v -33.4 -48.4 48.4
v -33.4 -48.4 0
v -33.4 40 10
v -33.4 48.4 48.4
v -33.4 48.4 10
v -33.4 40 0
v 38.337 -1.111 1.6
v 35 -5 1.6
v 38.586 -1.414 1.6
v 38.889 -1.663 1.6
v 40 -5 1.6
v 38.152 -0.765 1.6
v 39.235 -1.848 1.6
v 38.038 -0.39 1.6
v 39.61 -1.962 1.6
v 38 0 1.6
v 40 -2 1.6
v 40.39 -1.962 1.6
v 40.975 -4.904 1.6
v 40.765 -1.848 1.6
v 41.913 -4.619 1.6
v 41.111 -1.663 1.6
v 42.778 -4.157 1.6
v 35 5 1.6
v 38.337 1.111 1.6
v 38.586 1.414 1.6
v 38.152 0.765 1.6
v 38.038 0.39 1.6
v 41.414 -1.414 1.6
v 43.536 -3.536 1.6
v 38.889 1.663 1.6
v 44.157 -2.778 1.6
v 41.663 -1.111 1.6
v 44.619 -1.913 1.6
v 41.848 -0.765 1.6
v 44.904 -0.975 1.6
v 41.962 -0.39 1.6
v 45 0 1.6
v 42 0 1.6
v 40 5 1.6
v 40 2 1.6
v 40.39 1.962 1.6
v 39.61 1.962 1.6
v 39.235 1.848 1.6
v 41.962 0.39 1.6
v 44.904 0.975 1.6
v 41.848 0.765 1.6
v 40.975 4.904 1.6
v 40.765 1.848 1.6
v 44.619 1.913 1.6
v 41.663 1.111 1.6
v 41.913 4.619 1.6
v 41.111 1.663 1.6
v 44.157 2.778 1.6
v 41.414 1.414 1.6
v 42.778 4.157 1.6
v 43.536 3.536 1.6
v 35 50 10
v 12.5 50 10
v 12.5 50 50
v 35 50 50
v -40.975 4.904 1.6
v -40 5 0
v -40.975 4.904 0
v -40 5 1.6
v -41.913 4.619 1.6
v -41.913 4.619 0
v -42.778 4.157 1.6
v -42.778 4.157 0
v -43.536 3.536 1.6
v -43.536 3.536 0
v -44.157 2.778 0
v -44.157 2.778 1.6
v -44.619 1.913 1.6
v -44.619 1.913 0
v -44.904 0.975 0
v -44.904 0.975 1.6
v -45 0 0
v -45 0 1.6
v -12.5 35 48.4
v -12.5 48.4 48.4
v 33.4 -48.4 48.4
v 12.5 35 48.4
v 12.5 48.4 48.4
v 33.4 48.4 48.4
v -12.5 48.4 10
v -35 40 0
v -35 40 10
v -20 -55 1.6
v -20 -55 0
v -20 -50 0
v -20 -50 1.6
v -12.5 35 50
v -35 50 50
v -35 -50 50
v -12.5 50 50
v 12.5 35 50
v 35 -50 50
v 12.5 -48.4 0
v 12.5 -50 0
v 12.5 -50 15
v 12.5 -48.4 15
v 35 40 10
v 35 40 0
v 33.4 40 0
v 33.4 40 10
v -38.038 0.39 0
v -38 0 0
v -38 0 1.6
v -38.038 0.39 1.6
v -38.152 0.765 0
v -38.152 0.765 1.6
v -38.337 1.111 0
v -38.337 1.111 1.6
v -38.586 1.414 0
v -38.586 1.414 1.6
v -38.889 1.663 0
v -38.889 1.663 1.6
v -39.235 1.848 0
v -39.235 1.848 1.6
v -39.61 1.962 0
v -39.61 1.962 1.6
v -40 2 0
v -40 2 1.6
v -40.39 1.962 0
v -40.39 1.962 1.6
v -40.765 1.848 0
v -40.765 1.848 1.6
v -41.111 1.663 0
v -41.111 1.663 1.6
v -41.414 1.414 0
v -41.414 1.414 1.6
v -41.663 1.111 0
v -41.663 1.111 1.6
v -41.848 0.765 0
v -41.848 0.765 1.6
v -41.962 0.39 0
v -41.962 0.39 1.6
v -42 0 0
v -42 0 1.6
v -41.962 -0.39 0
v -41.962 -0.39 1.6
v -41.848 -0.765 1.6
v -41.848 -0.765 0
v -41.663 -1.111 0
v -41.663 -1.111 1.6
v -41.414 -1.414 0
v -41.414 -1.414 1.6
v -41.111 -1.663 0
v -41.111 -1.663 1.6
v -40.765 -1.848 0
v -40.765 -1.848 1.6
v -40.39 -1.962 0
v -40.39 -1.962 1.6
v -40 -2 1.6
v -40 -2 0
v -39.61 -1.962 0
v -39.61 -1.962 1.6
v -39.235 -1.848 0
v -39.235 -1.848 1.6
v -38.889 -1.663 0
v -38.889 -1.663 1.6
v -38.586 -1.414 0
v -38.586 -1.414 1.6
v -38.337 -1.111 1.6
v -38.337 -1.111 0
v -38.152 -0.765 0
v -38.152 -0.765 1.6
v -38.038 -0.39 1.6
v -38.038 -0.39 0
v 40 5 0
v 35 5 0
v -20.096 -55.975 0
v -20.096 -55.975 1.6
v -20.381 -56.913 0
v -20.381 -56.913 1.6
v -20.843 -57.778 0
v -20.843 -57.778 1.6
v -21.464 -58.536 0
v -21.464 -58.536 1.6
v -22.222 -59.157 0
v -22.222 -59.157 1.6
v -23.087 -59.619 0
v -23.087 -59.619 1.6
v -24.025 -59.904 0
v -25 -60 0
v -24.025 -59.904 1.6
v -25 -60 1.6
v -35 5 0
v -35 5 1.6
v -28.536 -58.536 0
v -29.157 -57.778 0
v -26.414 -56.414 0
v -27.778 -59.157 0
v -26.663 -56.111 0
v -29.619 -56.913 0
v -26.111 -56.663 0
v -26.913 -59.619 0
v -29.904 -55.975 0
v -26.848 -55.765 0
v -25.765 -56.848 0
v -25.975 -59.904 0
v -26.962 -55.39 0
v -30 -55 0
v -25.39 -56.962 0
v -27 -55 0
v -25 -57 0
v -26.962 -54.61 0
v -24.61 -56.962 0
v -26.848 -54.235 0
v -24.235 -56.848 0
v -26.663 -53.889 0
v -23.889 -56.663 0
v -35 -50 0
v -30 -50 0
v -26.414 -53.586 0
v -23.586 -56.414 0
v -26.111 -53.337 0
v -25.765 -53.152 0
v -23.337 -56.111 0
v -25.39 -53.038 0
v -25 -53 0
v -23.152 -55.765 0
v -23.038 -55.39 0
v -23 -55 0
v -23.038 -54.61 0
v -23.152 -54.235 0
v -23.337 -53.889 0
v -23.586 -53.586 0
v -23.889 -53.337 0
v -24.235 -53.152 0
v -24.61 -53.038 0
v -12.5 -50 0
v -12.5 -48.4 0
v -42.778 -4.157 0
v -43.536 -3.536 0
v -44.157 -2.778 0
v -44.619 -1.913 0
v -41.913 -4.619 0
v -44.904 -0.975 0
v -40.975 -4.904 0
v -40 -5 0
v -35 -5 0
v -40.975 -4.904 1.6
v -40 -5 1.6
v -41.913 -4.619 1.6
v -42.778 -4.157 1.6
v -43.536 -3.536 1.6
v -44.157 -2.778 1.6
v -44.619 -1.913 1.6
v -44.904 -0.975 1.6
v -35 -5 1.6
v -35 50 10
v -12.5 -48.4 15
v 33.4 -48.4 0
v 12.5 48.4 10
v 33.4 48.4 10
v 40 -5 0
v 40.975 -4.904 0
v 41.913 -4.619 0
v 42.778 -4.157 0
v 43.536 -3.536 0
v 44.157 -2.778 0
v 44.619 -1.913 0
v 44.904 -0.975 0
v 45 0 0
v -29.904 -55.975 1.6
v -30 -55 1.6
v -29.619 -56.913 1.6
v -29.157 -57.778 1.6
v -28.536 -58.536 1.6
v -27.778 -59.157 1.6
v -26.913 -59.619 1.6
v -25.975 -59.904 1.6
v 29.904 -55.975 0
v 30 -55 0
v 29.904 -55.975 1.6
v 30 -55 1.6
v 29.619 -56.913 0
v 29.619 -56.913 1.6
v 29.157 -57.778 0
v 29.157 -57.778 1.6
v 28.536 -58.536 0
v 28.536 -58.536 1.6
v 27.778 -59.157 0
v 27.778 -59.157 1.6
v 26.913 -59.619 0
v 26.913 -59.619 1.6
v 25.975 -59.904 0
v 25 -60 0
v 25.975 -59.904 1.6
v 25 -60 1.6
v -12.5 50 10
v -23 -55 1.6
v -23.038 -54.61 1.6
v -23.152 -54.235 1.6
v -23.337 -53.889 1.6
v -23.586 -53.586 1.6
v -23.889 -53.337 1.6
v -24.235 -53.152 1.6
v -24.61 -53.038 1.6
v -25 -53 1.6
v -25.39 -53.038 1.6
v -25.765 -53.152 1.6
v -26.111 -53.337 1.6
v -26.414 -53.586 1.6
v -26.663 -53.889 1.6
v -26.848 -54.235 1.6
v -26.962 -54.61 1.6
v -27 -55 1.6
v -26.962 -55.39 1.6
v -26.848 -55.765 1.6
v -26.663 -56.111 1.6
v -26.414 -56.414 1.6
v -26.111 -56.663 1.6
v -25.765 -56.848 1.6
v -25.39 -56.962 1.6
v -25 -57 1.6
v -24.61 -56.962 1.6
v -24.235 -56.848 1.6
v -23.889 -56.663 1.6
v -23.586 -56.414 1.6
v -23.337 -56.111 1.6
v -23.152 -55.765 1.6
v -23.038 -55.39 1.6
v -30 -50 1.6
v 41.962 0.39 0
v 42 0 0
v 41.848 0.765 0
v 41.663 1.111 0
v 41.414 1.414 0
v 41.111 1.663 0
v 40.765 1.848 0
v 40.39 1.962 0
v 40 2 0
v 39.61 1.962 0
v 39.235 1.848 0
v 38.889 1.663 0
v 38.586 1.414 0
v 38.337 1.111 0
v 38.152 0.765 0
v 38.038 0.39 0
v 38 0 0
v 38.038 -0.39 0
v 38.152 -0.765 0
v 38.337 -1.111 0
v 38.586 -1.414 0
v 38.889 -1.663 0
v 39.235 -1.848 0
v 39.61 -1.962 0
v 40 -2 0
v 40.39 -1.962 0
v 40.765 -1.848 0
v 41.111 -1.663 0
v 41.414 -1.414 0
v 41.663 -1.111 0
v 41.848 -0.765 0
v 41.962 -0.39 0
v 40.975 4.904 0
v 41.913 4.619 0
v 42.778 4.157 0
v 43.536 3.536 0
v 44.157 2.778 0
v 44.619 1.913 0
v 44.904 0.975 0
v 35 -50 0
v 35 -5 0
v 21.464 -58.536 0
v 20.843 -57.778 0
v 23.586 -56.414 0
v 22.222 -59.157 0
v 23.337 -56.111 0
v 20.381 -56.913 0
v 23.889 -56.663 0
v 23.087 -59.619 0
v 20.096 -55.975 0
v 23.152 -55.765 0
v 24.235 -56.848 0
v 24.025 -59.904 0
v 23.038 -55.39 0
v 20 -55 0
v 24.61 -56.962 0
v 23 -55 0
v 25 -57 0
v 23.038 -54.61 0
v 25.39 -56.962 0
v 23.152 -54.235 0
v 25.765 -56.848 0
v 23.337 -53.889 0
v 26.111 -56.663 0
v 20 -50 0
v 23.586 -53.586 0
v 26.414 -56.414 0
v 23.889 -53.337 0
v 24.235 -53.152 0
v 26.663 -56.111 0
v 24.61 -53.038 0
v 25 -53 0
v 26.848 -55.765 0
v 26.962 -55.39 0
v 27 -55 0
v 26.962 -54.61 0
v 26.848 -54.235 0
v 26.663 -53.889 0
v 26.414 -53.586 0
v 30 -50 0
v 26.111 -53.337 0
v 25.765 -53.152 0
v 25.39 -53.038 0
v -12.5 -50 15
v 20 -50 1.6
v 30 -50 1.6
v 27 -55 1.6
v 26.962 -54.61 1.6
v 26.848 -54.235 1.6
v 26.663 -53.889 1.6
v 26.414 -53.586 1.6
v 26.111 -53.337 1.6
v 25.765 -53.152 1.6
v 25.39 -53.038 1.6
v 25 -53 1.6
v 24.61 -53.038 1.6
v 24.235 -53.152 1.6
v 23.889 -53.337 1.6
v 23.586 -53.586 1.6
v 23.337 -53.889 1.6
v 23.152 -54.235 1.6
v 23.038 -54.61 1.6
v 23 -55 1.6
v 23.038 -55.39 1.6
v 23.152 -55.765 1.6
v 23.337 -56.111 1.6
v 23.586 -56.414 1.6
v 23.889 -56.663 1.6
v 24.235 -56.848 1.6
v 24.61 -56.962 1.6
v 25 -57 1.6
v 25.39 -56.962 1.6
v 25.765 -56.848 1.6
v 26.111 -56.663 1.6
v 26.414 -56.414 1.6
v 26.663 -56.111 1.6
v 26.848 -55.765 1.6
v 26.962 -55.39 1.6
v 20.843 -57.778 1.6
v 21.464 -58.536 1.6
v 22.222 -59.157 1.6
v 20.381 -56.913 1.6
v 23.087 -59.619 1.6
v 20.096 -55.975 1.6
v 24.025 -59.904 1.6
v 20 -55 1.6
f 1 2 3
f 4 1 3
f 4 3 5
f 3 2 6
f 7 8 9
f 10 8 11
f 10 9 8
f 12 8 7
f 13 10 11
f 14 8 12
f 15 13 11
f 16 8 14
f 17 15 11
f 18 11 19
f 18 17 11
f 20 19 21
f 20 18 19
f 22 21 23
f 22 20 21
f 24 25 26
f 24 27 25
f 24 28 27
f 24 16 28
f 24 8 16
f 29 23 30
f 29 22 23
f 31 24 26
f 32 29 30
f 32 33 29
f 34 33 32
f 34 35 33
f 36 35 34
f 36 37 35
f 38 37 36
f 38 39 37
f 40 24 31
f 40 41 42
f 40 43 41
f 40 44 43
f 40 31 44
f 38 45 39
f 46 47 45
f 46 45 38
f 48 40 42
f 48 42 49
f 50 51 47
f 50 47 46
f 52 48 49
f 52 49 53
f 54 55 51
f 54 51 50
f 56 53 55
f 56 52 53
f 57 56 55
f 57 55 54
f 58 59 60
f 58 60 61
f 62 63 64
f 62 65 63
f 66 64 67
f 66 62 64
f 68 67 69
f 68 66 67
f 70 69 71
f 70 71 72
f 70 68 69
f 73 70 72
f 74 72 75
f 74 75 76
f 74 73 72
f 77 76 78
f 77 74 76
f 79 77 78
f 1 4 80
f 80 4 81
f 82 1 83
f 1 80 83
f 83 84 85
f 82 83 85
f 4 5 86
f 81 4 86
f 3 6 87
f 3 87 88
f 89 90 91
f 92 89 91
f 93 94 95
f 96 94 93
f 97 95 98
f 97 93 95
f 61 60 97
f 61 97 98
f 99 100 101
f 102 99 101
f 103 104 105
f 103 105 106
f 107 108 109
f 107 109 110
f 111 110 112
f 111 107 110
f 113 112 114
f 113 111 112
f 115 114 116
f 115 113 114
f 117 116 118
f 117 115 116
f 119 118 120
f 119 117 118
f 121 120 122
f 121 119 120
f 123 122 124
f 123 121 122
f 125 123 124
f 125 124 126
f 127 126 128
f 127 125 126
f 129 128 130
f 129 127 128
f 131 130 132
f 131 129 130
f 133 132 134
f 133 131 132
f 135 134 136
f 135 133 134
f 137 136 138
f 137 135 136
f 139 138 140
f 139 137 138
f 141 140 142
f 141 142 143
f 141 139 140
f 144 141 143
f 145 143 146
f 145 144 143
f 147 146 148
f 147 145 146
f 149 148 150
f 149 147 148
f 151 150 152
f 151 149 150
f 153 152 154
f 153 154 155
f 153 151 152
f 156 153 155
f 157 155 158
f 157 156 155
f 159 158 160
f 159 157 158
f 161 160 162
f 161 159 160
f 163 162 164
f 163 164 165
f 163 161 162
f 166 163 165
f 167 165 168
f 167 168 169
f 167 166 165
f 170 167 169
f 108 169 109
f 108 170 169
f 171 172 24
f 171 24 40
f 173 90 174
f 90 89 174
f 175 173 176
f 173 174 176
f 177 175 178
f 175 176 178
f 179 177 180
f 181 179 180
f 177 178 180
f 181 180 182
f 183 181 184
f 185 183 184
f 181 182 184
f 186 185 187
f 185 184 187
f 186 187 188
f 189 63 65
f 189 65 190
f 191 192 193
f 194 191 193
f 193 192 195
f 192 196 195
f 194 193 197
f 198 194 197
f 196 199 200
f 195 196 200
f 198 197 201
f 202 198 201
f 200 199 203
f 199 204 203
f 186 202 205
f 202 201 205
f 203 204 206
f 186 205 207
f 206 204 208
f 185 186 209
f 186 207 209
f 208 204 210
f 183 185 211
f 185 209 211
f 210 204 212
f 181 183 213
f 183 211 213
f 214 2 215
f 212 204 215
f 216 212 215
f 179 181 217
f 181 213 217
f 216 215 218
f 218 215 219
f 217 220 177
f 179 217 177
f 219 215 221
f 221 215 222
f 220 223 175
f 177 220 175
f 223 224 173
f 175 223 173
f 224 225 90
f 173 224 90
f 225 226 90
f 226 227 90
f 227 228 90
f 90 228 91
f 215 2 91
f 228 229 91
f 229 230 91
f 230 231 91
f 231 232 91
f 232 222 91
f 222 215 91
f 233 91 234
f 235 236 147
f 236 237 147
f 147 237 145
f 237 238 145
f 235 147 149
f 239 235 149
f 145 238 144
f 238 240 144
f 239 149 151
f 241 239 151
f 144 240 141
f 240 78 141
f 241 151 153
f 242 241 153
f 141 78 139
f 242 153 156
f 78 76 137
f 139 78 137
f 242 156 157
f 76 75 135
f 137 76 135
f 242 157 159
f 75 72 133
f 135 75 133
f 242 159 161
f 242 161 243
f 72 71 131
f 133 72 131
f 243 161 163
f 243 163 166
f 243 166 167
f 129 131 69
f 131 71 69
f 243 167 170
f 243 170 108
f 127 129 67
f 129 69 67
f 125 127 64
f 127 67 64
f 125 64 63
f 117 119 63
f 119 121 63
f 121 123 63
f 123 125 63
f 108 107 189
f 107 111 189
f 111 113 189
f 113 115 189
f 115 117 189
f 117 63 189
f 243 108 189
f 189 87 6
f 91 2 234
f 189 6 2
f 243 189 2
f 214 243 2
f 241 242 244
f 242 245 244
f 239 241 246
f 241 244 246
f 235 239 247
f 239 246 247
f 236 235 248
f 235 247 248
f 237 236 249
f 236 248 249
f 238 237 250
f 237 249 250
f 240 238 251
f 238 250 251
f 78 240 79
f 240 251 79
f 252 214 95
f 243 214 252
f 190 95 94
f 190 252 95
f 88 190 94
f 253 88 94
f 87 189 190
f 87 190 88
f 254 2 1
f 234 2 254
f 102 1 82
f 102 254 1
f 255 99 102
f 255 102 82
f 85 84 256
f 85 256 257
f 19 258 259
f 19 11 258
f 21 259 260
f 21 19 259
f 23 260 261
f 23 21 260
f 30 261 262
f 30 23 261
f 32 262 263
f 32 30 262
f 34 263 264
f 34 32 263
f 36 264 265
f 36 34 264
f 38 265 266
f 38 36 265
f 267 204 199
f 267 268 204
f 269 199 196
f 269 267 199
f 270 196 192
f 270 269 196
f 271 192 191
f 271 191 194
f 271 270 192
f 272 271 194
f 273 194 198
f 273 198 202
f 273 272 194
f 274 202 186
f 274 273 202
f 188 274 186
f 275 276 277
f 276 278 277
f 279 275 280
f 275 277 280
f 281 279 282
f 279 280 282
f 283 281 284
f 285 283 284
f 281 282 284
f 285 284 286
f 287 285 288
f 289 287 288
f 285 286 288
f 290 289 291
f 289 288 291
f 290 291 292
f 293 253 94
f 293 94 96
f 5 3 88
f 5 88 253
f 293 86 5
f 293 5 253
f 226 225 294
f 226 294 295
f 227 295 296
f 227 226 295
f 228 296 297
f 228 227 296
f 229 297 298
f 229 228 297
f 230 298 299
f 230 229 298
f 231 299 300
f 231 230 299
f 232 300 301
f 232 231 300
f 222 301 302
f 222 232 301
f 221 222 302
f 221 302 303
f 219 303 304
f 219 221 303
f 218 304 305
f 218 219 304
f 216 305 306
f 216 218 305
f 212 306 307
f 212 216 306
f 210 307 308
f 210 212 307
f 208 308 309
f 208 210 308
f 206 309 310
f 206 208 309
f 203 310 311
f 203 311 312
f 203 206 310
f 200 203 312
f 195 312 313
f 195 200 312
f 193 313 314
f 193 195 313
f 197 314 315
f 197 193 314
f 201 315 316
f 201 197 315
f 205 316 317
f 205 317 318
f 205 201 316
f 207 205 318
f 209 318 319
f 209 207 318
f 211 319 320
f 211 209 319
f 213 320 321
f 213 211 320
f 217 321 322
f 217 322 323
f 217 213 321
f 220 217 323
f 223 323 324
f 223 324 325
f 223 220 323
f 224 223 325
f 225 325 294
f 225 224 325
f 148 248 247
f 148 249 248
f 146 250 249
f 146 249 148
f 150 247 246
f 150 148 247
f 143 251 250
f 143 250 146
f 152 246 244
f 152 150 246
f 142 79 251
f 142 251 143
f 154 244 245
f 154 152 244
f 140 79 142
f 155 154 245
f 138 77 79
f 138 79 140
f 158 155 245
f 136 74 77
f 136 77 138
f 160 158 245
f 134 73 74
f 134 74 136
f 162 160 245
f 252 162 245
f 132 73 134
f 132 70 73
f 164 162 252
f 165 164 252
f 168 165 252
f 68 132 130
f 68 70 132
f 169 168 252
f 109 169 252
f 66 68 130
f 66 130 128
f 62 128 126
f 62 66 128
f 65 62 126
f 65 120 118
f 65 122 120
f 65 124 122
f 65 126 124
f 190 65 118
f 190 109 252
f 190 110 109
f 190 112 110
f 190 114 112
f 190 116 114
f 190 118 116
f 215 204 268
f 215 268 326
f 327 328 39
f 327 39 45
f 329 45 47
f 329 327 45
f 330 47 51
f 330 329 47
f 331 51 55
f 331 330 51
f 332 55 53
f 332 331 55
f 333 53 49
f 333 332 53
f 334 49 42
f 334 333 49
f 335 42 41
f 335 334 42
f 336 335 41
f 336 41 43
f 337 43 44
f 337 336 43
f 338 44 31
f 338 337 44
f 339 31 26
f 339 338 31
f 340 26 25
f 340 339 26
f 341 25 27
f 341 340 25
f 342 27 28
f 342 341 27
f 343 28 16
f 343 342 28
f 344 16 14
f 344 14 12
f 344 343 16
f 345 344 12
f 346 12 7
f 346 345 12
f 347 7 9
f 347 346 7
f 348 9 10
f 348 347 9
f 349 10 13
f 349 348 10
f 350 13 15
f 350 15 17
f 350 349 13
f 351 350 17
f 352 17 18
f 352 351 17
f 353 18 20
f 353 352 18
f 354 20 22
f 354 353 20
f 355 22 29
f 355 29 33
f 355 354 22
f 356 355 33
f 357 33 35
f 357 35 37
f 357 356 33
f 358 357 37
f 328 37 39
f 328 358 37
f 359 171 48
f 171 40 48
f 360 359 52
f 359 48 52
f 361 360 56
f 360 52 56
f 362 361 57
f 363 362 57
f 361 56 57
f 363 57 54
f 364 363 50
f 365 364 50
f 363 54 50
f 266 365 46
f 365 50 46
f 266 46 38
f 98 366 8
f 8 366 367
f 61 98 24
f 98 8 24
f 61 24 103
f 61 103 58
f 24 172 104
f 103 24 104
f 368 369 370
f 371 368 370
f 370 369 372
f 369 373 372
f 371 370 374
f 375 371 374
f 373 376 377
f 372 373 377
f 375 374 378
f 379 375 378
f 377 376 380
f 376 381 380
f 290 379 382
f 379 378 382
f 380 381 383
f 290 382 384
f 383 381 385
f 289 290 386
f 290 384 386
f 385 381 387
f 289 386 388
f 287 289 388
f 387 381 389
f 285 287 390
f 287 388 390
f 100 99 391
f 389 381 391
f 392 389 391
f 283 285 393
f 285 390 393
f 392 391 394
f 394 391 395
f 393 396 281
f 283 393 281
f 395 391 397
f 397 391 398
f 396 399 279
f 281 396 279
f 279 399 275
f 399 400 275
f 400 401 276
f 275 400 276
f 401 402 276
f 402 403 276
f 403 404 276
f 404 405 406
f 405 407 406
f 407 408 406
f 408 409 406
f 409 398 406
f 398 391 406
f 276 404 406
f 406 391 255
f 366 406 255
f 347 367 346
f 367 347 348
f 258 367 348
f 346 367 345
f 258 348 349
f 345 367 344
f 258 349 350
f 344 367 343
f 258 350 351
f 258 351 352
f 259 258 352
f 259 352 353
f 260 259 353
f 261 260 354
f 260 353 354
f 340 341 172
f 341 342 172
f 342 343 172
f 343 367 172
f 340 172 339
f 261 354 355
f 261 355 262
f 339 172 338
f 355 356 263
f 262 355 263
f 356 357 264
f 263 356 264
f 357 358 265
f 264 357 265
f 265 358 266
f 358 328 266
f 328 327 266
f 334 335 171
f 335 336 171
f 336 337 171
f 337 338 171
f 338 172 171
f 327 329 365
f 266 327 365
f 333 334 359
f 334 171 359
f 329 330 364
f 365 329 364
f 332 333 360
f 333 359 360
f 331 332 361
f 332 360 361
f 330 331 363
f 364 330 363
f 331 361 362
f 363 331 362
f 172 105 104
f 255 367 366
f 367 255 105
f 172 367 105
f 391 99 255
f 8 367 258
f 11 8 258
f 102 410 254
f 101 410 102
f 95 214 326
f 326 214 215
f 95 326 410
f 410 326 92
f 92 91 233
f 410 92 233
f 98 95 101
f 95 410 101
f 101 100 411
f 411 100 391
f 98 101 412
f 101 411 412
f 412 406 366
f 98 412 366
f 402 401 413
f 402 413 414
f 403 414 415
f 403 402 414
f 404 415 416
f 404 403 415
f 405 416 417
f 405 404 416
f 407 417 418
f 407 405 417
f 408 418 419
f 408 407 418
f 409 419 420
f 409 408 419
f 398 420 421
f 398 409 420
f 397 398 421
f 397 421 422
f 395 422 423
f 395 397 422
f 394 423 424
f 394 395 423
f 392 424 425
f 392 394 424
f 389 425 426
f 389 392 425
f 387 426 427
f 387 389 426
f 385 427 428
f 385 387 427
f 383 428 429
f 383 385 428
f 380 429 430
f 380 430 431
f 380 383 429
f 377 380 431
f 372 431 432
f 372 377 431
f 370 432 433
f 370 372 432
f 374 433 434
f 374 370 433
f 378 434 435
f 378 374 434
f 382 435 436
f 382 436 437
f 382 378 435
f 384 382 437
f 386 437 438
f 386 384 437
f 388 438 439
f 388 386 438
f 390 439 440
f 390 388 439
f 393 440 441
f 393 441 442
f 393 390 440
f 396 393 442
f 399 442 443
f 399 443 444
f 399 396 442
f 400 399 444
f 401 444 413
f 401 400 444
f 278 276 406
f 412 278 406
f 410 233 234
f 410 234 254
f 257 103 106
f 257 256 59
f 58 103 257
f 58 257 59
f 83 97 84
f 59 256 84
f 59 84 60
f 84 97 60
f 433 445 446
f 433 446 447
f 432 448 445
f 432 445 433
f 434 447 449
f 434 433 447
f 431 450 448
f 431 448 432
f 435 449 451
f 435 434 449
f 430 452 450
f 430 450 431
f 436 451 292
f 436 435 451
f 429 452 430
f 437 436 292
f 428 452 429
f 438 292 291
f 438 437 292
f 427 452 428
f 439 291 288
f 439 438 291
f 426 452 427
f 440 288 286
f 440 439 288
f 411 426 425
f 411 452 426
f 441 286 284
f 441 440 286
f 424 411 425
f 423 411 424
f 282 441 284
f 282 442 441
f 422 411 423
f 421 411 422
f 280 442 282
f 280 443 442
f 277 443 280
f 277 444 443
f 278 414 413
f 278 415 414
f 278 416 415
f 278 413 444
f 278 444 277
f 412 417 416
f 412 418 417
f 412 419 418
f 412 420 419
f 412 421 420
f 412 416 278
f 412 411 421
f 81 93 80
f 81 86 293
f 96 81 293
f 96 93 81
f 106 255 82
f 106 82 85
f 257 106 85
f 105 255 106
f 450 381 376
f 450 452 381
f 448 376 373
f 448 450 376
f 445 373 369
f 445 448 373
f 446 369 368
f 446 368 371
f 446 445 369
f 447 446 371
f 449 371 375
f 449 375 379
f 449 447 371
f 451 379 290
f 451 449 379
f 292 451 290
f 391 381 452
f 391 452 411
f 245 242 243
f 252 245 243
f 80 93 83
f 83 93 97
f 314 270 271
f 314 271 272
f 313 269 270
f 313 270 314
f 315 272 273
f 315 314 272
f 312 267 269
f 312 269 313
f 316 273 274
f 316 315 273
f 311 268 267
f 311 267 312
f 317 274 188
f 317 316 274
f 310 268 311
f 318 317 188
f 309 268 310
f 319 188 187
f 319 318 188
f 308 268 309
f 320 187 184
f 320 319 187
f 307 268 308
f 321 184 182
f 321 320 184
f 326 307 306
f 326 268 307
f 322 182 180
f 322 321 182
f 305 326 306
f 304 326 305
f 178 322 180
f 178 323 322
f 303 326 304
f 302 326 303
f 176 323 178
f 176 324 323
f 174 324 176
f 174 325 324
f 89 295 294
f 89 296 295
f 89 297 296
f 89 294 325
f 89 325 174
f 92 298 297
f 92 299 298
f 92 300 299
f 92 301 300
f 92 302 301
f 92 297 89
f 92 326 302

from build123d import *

# Parameters (mm, degrees)
F0_W      = 70
F0_H      = 100
F1_DEPTH  = 50
F2_T      = -1.6
F3_W      = 10
F3_H      = 10
F4_DEPTH  = 70.001
F5_W      = 10
F5_H      = 10
F5_R      = 2
F6_DEPTH  = 1.6
F7_R      = 4.99999
F8_W      = 25
F8_H      = 15
F9_DEPTH  = 50.001
F10_W     = 25
F10_H     = 15
F11_DEPTH = 100.001


# Not quite as in the source:
# - a fillet or chamfer is up to 0.001 mm smaller than in the source, because OpenCascade refuses the exact size


with BuildPart() as f1:
    # F0 (on Top) → F1 (new body)
    with BuildSketch(Plane.XY):
        Rectangle(F0_W, F0_H)
    extrude(amount=F1_DEPTH)

    # F2
    f2_openings = [f1.faces().sort_by_distance(p)[0] for p in [
        (0, 0, 0),
    ]]
    offset(amount=F2_T, openings=f2_openings)

    # F3 (on face) → F4 (cut, through all)
    with BuildSketch(Plane.YZ.offset(35)):
        with Locations((45, 5)):
            Rectangle(F3_W, F3_H)
    extrude(amount=-F4_DEPTH, mode=Mode.SUBTRACT)

    # F5 (on Top) → F6 (join)
    with BuildSketch(Plane.XY):
        with Locations((40, 0)):
            Rectangle(F5_W, F5_H)
        with Locations((40, 0)):
            Circle(F5_R, mode=Mode.SUBTRACT)
        with Locations((-40, 0)):
            Rectangle(F5_W, F5_H)
        with Locations((-40, 0)):
            Circle(F5_R, mode=Mode.SUBTRACT)
        with Locations((-25, -55)):
            Rectangle(F5_W, F5_H)
        with Locations((-25, -55)):
            Circle(F5_R, mode=Mode.SUBTRACT)
        with Locations((25, -55)):
            Rectangle(F5_W, F5_H)
        with Locations((25, -55)):
            Circle(F5_R, mode=Mode.SUBTRACT)
    extrude(amount=F6_DEPTH)

    # F7 (radius 5 in the source; OpenCascade refuses exactly that, so slightly less here)
    f7_edges = [f1.edges().sort_by_distance(p)[0] for p in [
        (-45, -5, 0.8),
        (-45, 5, 0.8),
        (45, -5, 0.8),
        (45, 5, 0.8),
        (-30, -60, 0.8),
        (-20, -60, 0.8),
        (20, -60, 0.8),
        (30, -60, 0.8),
    ]]
    fillet(f7_edges, radius=F7_R)

    # F8 (on face) → F9 (cut, through all)
    with BuildSketch(Plane.XY.offset(50)):
        with Locations((0, 42.5)):
            Rectangle(F8_W, F8_H)
    extrude(amount=-F9_DEPTH, mode=Mode.SUBTRACT)

    # F10 (on face) → F11 (cut, through all)
    with BuildSketch(Plane.XZ.offset(50)):
        with Locations((0, 7.5)):
            Rectangle(F10_W, F10_H)
    extrude(amount=-F11_DEPTH, mode=Mode.SUBTRACT)


solid = f1.part
